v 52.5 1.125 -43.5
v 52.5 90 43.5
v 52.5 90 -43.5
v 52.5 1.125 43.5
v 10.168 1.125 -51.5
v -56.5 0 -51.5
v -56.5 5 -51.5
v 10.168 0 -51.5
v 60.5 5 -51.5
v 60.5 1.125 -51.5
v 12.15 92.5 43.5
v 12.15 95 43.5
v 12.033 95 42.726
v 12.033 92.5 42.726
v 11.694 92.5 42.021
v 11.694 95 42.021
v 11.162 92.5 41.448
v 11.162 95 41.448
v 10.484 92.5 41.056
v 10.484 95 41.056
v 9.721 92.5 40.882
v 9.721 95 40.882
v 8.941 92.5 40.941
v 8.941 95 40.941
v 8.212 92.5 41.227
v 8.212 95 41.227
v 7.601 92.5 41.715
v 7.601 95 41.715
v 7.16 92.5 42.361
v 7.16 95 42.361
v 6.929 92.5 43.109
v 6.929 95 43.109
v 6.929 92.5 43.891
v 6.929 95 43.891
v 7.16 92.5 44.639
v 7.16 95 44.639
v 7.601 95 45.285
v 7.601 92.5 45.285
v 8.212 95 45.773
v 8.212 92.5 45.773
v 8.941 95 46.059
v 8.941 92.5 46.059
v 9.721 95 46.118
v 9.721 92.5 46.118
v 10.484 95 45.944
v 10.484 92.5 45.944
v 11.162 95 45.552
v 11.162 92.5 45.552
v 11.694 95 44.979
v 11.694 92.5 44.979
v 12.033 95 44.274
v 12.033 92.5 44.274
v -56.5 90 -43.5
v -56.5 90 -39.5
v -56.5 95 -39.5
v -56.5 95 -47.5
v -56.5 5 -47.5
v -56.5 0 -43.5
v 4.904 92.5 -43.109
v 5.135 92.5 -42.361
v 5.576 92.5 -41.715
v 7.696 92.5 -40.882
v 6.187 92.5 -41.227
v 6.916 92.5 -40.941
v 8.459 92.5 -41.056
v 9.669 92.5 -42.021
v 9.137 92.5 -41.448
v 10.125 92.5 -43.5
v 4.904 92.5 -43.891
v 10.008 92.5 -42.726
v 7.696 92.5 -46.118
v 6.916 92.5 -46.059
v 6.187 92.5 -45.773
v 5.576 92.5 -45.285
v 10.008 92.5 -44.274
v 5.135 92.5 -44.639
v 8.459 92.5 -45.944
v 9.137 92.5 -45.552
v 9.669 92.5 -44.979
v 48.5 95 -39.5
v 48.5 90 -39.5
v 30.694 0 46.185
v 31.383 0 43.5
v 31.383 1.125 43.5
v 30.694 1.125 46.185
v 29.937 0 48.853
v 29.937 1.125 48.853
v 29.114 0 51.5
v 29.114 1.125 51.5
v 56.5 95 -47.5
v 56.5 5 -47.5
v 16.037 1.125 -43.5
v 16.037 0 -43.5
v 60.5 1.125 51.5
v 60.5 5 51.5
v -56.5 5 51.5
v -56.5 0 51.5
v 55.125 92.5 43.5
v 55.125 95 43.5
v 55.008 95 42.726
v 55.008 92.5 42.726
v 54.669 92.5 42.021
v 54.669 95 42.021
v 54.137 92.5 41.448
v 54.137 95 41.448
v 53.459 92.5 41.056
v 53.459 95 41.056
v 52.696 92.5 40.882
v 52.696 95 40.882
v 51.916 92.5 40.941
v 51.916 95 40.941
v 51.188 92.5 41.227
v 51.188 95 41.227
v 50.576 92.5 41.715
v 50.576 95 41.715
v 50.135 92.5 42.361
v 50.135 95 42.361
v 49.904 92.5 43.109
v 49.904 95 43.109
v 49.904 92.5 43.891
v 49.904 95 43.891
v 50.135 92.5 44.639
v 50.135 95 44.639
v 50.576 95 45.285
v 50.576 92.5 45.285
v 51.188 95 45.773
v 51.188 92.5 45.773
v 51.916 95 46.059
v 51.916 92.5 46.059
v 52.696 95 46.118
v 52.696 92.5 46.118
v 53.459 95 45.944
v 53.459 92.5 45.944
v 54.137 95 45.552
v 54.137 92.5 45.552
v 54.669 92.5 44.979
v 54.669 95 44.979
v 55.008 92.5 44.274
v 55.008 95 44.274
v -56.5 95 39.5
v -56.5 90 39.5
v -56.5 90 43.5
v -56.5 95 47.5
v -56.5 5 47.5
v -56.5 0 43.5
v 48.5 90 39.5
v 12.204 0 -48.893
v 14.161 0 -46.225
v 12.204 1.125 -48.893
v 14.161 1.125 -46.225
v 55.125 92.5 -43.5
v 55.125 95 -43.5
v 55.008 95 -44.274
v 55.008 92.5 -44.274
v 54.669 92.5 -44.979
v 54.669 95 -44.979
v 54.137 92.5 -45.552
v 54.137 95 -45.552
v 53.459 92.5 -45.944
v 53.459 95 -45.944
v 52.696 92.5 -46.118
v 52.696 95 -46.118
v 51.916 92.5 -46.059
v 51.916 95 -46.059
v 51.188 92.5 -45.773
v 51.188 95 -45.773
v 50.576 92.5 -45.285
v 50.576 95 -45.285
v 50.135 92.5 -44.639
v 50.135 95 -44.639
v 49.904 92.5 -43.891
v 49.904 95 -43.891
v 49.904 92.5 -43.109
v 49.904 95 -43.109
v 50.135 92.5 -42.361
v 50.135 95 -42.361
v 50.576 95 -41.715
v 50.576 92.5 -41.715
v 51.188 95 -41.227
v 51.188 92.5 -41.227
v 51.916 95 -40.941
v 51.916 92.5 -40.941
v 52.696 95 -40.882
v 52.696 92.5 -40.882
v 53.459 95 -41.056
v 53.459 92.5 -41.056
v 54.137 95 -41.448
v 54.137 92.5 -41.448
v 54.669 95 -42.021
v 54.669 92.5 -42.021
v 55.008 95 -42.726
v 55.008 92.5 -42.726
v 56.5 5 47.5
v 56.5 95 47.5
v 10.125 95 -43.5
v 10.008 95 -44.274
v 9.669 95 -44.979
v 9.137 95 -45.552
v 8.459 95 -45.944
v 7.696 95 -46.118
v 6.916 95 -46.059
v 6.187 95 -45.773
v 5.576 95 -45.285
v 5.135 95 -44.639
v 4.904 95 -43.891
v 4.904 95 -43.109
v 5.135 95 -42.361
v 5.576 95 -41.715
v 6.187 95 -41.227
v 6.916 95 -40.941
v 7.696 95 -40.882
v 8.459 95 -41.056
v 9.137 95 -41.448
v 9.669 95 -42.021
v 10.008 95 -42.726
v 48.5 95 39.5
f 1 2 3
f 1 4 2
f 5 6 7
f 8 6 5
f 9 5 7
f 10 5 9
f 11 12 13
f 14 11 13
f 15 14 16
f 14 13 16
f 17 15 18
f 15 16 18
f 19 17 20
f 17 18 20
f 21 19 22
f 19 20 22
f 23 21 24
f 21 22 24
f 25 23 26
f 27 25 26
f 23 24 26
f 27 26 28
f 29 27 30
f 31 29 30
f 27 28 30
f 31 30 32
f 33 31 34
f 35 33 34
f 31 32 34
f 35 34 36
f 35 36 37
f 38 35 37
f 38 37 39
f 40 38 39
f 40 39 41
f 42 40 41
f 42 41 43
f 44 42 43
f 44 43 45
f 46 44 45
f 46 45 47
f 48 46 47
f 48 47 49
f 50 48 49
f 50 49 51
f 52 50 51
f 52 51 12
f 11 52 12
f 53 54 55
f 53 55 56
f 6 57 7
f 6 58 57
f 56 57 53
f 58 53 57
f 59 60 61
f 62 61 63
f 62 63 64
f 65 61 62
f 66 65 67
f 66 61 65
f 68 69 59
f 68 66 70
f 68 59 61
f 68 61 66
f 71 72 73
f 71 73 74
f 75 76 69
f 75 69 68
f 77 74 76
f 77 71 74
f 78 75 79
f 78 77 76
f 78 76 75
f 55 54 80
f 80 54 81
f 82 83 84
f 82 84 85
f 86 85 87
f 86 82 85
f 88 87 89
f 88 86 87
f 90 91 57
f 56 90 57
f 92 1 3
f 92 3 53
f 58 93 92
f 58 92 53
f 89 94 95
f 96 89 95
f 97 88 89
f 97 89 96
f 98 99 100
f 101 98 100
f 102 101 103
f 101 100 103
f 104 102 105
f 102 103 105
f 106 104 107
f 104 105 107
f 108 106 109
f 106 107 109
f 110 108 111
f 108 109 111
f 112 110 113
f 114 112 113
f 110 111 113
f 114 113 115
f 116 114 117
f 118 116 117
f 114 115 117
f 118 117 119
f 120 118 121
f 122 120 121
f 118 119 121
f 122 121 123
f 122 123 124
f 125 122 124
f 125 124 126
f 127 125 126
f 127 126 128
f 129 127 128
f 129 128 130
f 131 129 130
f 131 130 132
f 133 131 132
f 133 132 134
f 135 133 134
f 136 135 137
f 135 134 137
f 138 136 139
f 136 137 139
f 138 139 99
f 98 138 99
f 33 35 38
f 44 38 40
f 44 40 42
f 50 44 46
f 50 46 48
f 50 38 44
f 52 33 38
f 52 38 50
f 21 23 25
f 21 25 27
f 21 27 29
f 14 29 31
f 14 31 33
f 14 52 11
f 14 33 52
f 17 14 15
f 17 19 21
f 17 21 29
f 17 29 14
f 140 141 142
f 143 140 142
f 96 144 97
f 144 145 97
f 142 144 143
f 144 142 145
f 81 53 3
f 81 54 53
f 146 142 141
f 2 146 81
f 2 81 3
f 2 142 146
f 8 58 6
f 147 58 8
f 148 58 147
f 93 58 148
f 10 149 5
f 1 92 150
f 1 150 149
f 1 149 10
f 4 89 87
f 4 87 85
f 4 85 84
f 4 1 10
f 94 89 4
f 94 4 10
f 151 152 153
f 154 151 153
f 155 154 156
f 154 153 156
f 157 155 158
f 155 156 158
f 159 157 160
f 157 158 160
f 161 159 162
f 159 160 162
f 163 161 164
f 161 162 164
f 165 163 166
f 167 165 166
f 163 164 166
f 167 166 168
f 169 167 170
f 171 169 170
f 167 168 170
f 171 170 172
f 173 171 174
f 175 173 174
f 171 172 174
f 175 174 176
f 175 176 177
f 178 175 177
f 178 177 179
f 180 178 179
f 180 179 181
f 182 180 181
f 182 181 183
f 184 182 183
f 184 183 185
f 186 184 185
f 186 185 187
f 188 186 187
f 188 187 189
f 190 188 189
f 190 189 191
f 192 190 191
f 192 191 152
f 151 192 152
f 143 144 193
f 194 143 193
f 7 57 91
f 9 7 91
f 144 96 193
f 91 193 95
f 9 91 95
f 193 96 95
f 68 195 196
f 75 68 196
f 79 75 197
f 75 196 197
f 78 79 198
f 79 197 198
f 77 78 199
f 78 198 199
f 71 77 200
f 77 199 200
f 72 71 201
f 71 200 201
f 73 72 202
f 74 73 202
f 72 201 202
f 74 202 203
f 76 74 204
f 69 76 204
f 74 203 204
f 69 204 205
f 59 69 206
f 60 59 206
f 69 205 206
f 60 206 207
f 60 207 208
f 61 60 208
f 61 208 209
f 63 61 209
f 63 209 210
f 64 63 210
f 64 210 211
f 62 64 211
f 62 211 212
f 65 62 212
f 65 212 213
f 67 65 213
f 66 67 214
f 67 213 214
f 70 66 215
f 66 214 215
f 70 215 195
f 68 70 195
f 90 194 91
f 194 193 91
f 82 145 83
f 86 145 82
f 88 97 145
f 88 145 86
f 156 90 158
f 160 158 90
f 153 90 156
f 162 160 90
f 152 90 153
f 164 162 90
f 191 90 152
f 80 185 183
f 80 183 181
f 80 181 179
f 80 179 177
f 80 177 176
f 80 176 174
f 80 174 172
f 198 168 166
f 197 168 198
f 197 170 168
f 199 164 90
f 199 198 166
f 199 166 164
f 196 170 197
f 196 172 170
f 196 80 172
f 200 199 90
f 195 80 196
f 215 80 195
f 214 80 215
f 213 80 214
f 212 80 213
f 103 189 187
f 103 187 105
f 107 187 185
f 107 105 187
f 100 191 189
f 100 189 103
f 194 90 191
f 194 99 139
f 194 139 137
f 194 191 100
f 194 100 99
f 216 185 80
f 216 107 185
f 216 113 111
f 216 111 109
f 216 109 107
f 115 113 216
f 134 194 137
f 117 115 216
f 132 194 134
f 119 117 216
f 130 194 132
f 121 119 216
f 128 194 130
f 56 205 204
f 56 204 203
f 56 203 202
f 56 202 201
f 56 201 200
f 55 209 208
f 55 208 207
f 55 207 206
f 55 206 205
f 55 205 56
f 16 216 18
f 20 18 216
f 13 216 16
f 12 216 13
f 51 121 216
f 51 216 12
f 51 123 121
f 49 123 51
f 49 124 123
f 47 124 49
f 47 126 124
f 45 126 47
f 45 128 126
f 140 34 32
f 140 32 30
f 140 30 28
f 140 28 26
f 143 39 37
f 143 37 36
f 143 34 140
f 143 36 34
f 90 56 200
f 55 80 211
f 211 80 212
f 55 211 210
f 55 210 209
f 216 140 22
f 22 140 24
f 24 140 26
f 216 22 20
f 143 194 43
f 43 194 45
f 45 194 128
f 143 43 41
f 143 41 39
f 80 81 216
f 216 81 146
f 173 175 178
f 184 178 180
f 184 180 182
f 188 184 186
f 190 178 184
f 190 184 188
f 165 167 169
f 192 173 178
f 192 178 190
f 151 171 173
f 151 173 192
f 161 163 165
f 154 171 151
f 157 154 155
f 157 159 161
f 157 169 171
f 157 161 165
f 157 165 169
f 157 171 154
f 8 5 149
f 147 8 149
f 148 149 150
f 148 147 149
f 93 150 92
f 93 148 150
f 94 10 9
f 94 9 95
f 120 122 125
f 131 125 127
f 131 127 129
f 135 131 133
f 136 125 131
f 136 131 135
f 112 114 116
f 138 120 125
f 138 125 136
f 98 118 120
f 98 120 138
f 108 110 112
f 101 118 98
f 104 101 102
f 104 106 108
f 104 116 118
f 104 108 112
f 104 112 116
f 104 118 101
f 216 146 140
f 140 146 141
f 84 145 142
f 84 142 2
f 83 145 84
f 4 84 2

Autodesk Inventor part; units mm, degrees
ref_plane "YZ Plane" through (0, 0, 0) normal (1, 0, 0) x (0, 1, 0)
ref_plane "XZ Plane" through (0, 0, 0) normal (0, 1, 0) x (-1, 0, 0)
ref_plane "XY Plane" through (0, 0, 0) normal (0, 0, 1) x (1, 0, 0)
sketch "Sketch8" plane through (0, 0, 0) normal (0, 1, 0) x (-1, 0, 0)
  line L0 (-56.5, -47.5) -> (56.5, -47.5)
  line L1 (56.5, -47.5) -> (56.5, 47.5)
  line L2 (56.5, 47.5) -> (-56.5, 47.5)
  line L3 (-56.5, 47.5) -> (-56.5, -47.5)
  line L4 (-56.5, -47.5) -> (56.5, 47.5) construction
  line L5 (56.5, -47.5) -> (-56.5, 47.5) construction
  point P0 (0, 0)
  dimension "d26" = 113
  dimension "d27" = 95
extrude "Extrusion7" add sketch "Sketch8" along normal blind 95
sketch "Sketch9" plane through (0, 0, 0) normal (0, -1, 0) x (1, 0, 0)
  line L0 (-56.5, 47.5) -> (56.5, 47.5) projected
  line L1 (-56.5, -47.5) -> (56.5, -47.5)
  line L2 (56.5, -47.5) -> (56.5, 47.5)
  line L3 (56.5, 47.5) -> (-56.5, 47.5)
  line L4 (-56.5, 47.5) -> (-56.5, -47.5)
  line L5 (-56.5, -47.5) -> (56.5, 47.5) construction
  line L6 (56.5, -47.5) -> (-56.5, 47.5) construction
  line L7 (52.5, 43.5) -> (52.5, -43.5)
  line L8 (52.5, -43.5) -> (-56.5, -43.5)
  line L9 (-56.5, 43.5) -> (52.5, 43.5)
  line L10 (48.5, -39.5) -> (48.5, 39.5)
  line L11 (48.5, 39.5) -> (-56.5, 39.5)
  line L12 (-56.5, -39.5) -> (48.5, -39.5)
  line L13 (-54.3018, -43.5) -> (-54.3018, -45.6519)
  line L14 (-54.3018, 45.6519) -> (-54.3018, 43.5)
  line L15 (-49.9386, 39.5) -> (-49.9386, 41.9838)
  line L16 (-49.9386, -41.9838) -> (-49.9386, -39.5)
  point P0 (0, 0)
  dimension "d30" = 4
  dimension "d31" = 4
  dimension "d47" = 4
  dimension "d48" = 4
  dimension "d49" = 4
  dimension "d50" = 4
extrude "Extrusion8" cut sketch "Sketch9" against normal blind 115 contours L11 L10 L12 L4
extrude "Extrusion9" cut sketch "Sketch9" against normal blind 90 contours L9 L7 L8 L4 L12 L10 L11
sketch "Sketch10" plane through (0, 0, 0) normal (0, -1, 0) x (1, 0, 0)
  line L0 (56.5, -47.5) -> (-56.5, -47.5)
  line L1 (-56.5, -47.5) -> (-56.5, 47.5)
  line L2 (-56.5, 47.5) -> (56.5, 47.5)
  line L3 (56.5, 47.5) -> (56.5, -47.5)
  line L4 (56.5, -47.5) -> (-56.5, 47.5) construction
  line L5 (-56.5, -47.5) -> (56.5, 47.5) construction
  line L6 (-60.5, 51.5) -> (-60.5, -51.5)
  line L7 (-60.5, -51.5) -> (60.5, -51.5)
  line L8 (60.5, -51.5) -> (60.5, 51.5)
  line L9 (60.5, 51.5) -> (-60.5, 51.5)
  line L10 (-56.5, 47.5) -> (-60.5, 47.5)
  line L11 (-56.5, -47.5) -> (-60.5, -47.5)
  line L12 (-56.5, 47.5) -> (-56.5, 51.5)
  line L13 (-56.5, -47.5) -> (-56.5, -51.5)
  point P0 (0, 0)
  dimension "d36" = 4
extrude "Extrusion10" add sketch "Sketch10" against normal blind 5 contours L3 L2 L12 L9 L8 L7 L13 L0
sketch "Sketch11" plane through (0, 0, 0) normal (0, -1, 0) x (1, 0, 0)
  circle A0 centre (-75.5, 17.5) radius 135
  line L0 (52.5, 43.5) -> (52.5, -43.5) projected
  line L1 (60.5, -51.5) -> (60.5, 51.5) projected
  circle A1 centre (-75.5, 17.5) radius 110
  line L2 (10.168, -51.5) -> (60.5, -51.5)
  line L3 (60.5, -51.5) -> (60.5, 51.5)
  line L4 (60.5, 51.5) -> (29.1136, 51.5)
  line L5 (-56.5, 51.5) -> (60.5, 51.5) projected
  point P0 (0, 0)
  dimension "d39" = 270
  dimension "d41" = 136
  dimension "d42" = 220
extrude "Extrusion11" cut sketch "Sketch11" against normal blind 1.125 contours A0 L2 A1 L4 | A0 L4 L1 L2 picked at (50.9054, 12.6578)
sketch "Sketch12" plane through (0, 95, 0) normal (0, 1, 0) x (1, 0, 0)
  line L0 (-56.5, -43.5) -> (52.5, -43.5) projected
  circle A0 centre (52.5, -43.5) radius 2.625
  line L1 (52.5, 43.5) -> (52.5, -43.5) projected
  circle A1 centre (52.5, 43.5) radius 2.625
  line L2 (52.5, 43.5) -> (-56.5, 43.5) projected
  circle A2 centre (7.5, 43.5) radius 2.625
  circle A3 centre (9.525, -43.5) radius 2.625
  point P0 (0, 0)
  dimension "d51" = 5.25
  dimension "d52" = 5.25
  dimension "d53" = 5.25
  dimension "d54" = 5.25
  dimension "d57" = 45
extrude "Extrusion13" cut sketch "Sketch12" against normal blind 2.5
properties part number "Galvo Housing-01"
